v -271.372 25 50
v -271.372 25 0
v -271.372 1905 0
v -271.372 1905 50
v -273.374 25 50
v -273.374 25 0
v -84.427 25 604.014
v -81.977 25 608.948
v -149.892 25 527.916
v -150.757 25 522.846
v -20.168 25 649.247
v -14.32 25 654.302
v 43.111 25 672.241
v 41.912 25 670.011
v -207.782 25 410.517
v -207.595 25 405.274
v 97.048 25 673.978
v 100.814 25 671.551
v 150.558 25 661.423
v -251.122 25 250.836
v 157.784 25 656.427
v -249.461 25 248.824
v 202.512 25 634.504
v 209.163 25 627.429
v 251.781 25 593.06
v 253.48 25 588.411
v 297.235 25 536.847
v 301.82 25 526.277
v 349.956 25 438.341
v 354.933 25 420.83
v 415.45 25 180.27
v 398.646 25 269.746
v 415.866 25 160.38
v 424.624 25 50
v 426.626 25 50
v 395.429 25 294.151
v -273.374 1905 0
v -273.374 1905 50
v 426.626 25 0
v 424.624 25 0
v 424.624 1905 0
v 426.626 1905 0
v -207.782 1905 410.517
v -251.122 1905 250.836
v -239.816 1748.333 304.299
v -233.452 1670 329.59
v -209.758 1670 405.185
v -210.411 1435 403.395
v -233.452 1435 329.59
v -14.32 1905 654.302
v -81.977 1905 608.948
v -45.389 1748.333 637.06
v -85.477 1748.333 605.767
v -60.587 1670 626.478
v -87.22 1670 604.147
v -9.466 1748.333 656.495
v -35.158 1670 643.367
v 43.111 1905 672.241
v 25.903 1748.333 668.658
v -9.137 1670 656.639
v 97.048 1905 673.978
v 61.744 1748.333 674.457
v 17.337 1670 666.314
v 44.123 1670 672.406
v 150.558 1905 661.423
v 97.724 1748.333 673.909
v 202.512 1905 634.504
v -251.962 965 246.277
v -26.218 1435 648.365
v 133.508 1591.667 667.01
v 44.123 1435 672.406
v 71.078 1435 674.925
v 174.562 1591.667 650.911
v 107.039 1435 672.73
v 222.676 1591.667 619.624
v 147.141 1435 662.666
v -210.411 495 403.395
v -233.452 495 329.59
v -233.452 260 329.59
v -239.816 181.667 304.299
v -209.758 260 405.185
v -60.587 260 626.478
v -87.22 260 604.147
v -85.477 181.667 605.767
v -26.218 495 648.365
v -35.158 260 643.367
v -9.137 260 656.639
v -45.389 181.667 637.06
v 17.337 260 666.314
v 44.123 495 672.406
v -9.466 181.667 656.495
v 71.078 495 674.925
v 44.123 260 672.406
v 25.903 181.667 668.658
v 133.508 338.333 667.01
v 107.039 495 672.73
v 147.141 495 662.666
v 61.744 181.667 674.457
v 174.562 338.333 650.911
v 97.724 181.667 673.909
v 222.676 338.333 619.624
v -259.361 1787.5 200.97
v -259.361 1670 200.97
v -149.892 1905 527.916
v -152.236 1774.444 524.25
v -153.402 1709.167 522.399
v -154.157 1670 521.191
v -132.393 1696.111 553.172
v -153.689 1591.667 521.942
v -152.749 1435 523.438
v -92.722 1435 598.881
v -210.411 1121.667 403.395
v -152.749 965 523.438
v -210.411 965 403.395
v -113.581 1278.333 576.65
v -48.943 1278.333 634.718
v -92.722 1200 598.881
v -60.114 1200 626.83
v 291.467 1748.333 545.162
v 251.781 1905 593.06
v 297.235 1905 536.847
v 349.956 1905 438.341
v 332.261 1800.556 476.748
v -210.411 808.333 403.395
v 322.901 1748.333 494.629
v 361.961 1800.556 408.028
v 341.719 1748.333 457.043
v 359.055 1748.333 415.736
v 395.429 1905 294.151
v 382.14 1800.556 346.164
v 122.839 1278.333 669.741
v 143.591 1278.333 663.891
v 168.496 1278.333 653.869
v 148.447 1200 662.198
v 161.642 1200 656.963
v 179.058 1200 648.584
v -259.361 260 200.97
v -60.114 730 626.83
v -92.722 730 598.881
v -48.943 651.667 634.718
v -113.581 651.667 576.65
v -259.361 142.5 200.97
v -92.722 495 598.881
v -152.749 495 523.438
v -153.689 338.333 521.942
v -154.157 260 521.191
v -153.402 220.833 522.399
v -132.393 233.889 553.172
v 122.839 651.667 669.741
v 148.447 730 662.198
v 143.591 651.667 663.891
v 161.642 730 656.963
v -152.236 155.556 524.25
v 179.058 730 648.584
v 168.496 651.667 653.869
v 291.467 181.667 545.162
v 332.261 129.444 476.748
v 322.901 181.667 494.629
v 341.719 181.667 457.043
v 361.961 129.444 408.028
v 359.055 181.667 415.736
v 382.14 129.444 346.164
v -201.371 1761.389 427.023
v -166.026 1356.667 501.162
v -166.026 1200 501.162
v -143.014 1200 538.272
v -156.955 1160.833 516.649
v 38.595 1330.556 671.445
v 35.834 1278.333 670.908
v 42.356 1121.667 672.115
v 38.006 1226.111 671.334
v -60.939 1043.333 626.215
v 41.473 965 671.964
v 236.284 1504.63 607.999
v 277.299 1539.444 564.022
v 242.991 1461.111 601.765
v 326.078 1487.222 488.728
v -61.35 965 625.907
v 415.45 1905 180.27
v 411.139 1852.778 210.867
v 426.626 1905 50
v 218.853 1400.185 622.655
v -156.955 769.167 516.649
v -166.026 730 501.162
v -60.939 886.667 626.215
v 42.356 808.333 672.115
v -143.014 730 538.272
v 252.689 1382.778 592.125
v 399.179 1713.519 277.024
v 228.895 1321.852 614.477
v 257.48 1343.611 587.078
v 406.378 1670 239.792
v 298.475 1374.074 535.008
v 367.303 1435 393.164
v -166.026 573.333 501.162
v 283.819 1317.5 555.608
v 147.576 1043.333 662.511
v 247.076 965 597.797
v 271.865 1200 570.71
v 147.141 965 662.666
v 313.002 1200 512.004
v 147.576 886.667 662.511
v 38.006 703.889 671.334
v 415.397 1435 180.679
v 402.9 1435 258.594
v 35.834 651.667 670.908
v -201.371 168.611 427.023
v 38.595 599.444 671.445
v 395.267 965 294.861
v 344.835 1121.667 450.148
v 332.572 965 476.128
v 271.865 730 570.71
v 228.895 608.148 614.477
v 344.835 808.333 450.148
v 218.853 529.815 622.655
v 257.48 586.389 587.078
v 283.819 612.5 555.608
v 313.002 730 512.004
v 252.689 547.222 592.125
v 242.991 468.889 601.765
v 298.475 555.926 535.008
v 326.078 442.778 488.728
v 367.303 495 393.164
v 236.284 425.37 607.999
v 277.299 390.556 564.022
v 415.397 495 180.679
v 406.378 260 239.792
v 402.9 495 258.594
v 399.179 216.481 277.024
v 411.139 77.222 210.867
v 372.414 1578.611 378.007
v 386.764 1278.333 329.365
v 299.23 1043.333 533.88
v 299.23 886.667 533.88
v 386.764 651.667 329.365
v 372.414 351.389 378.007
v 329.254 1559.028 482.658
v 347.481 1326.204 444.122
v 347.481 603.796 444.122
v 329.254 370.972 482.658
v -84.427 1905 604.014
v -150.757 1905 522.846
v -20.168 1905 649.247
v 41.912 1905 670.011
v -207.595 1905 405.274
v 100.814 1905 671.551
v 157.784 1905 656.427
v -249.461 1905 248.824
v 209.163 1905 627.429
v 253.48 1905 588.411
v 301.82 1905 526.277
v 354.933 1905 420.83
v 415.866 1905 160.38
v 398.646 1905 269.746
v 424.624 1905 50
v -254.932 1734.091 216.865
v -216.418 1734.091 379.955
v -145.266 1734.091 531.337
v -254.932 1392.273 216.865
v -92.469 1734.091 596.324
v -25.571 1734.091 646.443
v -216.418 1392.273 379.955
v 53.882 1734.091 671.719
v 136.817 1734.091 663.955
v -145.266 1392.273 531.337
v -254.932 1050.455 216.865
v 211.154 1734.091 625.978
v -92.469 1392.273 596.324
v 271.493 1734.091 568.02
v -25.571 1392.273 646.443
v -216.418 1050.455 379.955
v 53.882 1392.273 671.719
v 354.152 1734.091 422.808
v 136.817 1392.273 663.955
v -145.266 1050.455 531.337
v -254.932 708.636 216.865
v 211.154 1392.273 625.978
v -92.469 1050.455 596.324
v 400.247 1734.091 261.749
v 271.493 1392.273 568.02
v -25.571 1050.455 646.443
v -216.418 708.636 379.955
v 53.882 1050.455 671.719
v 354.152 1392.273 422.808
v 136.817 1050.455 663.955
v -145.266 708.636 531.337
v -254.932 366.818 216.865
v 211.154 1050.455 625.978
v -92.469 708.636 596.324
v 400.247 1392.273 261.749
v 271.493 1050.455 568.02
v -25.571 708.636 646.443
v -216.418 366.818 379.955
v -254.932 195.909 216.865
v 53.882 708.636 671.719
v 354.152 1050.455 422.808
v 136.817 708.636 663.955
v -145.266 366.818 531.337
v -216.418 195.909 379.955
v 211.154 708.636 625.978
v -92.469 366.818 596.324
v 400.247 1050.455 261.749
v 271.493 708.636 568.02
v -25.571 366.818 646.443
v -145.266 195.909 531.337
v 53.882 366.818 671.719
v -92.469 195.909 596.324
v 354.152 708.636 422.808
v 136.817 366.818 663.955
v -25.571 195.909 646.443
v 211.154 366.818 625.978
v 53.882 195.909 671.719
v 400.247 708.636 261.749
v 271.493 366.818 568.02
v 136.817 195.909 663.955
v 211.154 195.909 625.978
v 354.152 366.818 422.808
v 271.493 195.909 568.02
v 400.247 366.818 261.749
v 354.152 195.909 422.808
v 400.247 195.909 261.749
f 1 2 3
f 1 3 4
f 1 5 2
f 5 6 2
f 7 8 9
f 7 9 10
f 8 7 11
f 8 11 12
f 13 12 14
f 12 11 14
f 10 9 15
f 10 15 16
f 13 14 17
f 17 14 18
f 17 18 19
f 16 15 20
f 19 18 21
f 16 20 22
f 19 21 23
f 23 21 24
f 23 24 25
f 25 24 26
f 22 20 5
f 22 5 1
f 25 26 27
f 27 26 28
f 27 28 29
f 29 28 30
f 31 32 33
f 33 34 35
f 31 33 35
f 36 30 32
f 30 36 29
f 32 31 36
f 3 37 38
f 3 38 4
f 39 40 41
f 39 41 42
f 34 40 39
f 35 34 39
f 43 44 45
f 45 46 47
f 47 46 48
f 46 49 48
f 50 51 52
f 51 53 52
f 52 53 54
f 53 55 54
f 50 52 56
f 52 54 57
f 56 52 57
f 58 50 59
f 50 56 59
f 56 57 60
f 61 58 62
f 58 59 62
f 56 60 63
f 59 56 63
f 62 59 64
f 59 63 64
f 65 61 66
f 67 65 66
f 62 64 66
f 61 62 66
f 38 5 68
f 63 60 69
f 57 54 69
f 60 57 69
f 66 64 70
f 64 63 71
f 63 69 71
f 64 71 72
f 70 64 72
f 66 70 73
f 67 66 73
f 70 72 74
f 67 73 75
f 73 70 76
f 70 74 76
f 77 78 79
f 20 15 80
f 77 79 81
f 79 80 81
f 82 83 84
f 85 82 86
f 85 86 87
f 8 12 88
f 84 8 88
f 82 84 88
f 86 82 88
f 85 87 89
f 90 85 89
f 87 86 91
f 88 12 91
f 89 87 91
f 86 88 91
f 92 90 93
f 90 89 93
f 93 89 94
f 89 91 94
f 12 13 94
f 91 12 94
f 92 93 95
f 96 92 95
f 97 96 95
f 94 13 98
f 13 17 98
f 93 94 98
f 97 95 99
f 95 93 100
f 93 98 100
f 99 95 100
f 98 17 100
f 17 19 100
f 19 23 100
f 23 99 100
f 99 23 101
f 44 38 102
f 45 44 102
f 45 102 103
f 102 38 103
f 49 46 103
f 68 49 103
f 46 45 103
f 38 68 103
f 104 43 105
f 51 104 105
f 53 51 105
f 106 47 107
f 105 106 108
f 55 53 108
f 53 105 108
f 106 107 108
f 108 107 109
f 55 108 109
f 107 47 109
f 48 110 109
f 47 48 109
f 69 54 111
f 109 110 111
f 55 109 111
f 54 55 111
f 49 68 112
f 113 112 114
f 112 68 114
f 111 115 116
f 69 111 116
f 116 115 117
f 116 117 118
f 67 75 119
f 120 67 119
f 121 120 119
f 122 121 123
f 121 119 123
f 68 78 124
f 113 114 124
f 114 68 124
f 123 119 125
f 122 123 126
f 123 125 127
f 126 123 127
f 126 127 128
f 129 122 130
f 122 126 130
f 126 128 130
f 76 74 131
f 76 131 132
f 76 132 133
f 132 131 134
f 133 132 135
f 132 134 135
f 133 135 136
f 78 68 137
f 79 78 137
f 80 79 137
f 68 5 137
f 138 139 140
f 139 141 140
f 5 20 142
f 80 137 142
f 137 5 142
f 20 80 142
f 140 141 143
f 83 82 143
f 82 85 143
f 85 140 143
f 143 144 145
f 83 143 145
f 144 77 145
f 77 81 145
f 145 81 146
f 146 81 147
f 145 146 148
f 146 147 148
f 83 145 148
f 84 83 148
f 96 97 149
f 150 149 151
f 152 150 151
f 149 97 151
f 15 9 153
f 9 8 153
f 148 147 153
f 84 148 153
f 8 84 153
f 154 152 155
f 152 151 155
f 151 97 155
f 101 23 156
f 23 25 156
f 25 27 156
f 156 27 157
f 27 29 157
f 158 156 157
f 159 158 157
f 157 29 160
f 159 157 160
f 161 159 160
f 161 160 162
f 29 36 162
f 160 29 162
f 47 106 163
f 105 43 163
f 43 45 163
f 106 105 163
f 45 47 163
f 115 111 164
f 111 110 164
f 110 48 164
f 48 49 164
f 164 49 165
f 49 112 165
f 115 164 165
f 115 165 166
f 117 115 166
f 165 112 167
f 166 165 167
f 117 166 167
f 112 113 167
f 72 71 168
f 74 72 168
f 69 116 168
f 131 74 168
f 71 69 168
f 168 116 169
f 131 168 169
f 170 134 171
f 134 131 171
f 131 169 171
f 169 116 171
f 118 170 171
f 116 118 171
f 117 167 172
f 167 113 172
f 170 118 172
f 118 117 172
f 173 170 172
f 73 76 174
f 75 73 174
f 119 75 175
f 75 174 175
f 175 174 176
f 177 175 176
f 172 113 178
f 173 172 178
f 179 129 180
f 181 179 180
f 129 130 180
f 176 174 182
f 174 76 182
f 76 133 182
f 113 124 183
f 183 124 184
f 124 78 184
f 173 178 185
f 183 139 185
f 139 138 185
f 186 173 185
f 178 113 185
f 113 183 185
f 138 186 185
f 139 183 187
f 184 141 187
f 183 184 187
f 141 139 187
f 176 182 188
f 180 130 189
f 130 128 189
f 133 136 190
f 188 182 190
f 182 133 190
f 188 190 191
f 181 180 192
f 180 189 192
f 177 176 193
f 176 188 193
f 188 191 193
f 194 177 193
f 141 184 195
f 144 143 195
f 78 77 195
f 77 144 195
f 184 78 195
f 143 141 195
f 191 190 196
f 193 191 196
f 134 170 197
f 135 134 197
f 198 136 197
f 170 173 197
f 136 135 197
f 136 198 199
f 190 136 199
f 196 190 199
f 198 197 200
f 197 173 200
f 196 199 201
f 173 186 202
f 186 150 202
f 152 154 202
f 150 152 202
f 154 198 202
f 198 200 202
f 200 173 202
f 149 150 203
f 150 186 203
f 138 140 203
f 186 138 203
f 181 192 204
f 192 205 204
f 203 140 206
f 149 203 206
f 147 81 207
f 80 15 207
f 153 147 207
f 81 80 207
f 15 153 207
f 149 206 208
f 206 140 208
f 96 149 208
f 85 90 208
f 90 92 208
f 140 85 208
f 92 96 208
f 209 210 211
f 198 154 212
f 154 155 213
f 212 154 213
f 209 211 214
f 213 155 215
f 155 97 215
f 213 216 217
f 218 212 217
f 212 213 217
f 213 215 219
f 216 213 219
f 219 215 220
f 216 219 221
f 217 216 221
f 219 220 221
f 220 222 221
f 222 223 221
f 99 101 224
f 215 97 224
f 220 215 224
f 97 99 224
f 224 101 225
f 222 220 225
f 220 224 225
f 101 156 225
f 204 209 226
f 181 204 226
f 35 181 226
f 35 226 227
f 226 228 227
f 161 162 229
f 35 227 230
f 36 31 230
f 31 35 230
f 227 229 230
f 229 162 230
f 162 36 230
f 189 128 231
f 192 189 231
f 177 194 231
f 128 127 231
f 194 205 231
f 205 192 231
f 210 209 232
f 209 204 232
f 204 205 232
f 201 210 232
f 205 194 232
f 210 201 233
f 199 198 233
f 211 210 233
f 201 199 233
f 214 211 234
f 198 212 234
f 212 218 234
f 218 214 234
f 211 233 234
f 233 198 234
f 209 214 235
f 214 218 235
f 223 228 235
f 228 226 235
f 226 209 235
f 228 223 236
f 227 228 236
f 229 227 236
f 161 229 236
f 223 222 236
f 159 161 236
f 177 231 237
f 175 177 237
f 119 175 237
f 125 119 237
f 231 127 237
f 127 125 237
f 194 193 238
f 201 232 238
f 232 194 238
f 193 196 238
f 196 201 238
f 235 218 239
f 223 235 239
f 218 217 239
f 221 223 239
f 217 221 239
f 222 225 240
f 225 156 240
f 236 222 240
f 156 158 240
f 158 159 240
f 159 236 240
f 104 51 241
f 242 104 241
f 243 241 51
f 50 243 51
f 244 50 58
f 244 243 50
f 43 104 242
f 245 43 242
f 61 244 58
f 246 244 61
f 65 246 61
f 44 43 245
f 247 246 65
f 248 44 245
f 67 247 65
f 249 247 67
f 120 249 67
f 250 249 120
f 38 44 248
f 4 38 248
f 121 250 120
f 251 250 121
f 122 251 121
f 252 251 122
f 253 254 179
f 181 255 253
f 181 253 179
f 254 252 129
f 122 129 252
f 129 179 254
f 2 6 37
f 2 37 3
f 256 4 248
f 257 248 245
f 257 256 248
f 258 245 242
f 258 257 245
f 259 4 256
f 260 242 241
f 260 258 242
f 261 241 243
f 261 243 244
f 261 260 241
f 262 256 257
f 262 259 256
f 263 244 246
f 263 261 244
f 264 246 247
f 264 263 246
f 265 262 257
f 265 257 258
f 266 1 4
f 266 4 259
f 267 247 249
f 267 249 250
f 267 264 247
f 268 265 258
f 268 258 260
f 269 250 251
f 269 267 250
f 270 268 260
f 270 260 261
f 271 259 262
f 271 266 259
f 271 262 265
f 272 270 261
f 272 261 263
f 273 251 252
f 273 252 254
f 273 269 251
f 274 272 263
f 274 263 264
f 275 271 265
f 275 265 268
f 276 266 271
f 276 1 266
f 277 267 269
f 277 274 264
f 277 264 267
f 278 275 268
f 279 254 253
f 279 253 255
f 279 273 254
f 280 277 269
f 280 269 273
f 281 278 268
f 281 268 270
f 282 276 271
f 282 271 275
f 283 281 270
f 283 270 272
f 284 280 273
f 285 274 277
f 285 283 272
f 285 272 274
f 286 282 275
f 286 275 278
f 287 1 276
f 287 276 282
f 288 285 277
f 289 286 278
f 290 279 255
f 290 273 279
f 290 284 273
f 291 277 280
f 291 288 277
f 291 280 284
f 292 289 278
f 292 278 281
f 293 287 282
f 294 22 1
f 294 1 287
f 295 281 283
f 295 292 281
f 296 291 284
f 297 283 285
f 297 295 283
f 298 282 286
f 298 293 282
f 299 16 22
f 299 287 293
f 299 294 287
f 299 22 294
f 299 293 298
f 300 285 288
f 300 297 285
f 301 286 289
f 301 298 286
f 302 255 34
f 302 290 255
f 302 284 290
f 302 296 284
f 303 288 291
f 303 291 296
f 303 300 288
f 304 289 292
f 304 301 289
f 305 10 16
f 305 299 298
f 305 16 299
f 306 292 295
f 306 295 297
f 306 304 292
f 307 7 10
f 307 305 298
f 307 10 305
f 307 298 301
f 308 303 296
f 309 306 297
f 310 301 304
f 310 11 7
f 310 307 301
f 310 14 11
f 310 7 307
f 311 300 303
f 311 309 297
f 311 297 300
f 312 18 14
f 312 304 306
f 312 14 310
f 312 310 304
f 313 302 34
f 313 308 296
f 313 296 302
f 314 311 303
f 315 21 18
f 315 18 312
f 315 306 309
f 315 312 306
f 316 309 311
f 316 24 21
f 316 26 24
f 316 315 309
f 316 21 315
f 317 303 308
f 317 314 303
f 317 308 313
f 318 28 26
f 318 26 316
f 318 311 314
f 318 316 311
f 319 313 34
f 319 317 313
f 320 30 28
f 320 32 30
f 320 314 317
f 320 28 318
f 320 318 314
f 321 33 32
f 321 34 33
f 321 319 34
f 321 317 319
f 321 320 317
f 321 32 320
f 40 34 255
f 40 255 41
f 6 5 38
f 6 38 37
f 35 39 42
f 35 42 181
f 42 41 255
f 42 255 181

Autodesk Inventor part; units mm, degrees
ref_plane "YZ Plane" through (0, 0, 0) normal (1, 0, 0) x (0, 1, 0)
ref_plane "XZ Plane" through (0, 0, 0) normal (0, 1, 0) x (-1, 0, 0)
ref_plane "Work Plane1" through (76.6258, 25, 425) normal (-0.0000002, 1, 0) x (1, 0.0000002, 0)
sketch "Sketch1" plane through (76.6258, 25, 425) normal (-0.0000002, 1, 0) x (1, 0.0000002, 0)
  spline S0 degree 4 poles (-350, 375) (-320, -275) (0, -425) (320, -275) (350, 375) knots 1 1 1 1 1 2 2 2 2 2 projected
  line L0 (350, 375) -> (347.9979, 375)
  line L1 (347.9979, 375) -> (347.9979, 425)
  line L2 (347.9979, 425) -> (350, 425)
  line L3 (350, 425) -> (350, 375)
  line L4 (-347.9979, 375) -> (-350, 375)
  line L5 (-350, 375) -> (-350, 425)
  line L6 (-350, 425) -> (-347.9979, 425)
  line L7 (-347.9979, 425) -> (-347.9979, 375)
  line L8 (350, 425) -> (-350, 425) projected
  spline S1 degree 5 poles (-347.9979, 375) (-346.0284, 332.3773) (-342.7984, 289.8122) (-338.1422, 247.3651) (-326.7683, 170.9664) (-309.046, 95.8136) (-299.6921, 62.5697) (-279.8558, 3.4629) (-253.7566, -53.1178) (-240.7312, -77.6833) (-214.2698, -120.6219) (-182.0256, -159.3421) (-166.3213, -175.6301) (-134.7805, -203.1852) (-98.784, -224.4736) (-81.3473, -232.6678) (-46.0767, -244.8104) (-9.0446, -249.0034) (9.0446, -249.0034) (46.0767, -244.8104) (81.3473, -232.6678) (98.784, -224.4736) (134.7805, -203.1852) (166.3213, -175.6301) (182.0256, -159.3421) (214.2698, -120.6219) (240.7312, -77.6833) (253.7566, -53.1178) (279.8558, 3.4629) (299.6921, 62.5697) (309.046, 95.8136) (326.7683, 170.9664) (338.1422, 247.3651) (342.7984, 289.8122) (346.0284, 332.3773) (347.9979, 375) knots 0 0 0 0 0 0 0.137161 0.137161 0.137161 0.248035 0.248035 0.248035 0.337224 0.337224 0.337224 0.409677 0.409677 0.409677 0.471186 0.471186 0.471186 0.528814 0.528814 0.528814 0.590323 0.590323 0.590323 0.662776 0.662776 0.662776 0.751965 0.751965 0.751965 0.862839 0.862839 0.862839 1 1 1 1 1 1
  point P0 (-76.6258, 425)
  dimension "d0" = 2
ref_plane "Work Plane2" through (-283.6242, 1904.9999, -0.2055) normal (0.0000002, -1, 0) x (1, 0.0000002, 0)
extrude "Extrusion1" add sketch "Sketch1" along normal up to surface (1880 mm away) contours L4 S1 L0 S0 | L5 L6 L7 L4 | L0 L1 L2 L3
properties part number "canvas-cover-deployed"
